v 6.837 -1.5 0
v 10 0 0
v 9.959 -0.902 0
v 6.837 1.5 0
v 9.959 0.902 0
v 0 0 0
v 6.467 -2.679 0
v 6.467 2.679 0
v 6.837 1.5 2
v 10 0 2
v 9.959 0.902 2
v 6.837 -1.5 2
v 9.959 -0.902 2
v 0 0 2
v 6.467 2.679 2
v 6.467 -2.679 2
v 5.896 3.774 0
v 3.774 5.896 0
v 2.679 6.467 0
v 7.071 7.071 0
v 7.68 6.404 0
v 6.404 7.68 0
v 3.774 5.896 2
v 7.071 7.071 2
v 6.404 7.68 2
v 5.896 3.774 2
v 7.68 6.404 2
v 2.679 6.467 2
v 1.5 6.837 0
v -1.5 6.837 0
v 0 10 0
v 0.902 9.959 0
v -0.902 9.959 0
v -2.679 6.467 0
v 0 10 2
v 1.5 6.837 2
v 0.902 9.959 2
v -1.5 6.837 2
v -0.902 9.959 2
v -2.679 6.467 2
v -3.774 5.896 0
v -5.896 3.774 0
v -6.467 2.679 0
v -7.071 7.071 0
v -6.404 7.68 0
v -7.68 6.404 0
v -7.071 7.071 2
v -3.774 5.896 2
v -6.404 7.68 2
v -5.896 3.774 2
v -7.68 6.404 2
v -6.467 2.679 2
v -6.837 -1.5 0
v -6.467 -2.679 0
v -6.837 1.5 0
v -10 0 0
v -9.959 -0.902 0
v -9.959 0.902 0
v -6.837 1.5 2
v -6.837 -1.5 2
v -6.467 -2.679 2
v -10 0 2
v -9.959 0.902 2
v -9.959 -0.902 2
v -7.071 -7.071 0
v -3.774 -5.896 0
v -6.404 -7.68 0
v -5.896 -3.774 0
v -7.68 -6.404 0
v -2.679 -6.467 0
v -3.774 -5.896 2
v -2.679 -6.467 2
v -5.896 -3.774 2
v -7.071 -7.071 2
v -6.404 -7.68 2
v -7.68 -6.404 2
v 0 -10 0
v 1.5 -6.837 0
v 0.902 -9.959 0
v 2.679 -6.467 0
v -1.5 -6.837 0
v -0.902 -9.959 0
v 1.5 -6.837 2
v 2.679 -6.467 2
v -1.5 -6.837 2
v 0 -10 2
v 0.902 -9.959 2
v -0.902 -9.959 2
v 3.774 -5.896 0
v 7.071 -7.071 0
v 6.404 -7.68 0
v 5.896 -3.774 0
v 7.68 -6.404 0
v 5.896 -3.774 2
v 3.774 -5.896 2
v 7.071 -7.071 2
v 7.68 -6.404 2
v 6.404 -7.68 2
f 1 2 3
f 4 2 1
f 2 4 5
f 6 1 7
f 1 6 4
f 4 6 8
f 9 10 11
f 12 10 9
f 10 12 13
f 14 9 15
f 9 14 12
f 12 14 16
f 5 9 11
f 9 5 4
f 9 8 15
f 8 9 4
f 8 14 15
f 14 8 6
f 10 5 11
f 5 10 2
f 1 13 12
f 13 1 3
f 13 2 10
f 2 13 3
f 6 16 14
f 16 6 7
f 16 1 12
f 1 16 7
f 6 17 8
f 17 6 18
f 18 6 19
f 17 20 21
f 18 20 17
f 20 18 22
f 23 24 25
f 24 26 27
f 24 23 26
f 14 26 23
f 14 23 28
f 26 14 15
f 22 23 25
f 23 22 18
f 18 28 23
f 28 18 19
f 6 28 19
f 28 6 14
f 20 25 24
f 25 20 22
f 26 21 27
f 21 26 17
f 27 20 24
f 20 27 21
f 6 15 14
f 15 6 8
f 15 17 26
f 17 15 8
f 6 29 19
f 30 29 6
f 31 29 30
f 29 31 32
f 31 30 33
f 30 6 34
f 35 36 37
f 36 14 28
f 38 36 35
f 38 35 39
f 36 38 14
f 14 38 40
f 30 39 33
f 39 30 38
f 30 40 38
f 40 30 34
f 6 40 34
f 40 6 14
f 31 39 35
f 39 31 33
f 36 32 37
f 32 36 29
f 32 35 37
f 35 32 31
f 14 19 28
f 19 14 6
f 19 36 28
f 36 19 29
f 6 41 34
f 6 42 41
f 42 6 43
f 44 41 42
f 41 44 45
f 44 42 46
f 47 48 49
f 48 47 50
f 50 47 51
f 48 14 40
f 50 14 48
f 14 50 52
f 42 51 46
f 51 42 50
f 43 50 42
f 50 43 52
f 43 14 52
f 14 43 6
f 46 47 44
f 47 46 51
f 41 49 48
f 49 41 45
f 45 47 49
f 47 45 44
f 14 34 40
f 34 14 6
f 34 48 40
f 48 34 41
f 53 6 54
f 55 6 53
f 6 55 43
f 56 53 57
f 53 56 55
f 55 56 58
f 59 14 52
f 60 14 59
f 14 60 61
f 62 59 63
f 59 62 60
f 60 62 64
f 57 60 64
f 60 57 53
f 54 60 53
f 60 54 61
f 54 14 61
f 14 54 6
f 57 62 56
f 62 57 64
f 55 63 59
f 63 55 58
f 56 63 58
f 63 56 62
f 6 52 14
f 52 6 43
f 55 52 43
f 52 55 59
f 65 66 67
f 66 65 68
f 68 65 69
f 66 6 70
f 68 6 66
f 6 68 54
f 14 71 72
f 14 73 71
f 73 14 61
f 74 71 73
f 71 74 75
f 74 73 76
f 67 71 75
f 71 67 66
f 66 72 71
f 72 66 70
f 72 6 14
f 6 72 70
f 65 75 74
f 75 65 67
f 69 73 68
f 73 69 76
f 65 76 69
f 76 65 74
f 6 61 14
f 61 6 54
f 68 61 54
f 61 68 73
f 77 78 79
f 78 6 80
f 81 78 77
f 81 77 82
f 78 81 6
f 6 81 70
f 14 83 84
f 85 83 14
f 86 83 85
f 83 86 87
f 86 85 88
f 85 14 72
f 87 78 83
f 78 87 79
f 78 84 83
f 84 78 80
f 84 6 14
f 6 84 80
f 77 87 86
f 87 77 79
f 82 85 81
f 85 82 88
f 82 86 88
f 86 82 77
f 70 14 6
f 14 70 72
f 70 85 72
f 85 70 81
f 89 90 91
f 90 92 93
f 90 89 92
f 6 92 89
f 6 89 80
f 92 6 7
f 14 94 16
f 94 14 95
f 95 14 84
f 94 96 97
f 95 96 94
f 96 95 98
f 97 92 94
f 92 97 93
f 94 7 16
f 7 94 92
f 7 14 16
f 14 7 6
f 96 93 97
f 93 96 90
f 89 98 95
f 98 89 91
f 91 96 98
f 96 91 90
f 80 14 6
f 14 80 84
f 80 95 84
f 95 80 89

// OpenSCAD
module gear(n, r, h, l) {
    tooth_angle = 360 / n / 2;
    
    
    for (i = [0: n]) {
        rotate([0, 0, tooth_angle * i * 2])
        union() {
            linear_extrude(l)
            polygon([
                [0, 0],
                [r, 0],
                [r * cos(tooth_angle * .23), r * sin(tooth_angle * .23)],
                [(r-h) * cos(tooth_angle * .55), (r-h) * sin(tooth_angle * .55)],
                [(r-h) * cos(tooth_angle), (r-h) * sin(tooth_angle)]
            ]);
            
            linear_extrude(l)
            rotate([180, 0, 0])
            polygon([
                [0, 0],
                [r, 0],
                [r * cos(tooth_angle * .23), r * sin(tooth_angle * .23)],
                [(r-h) * cos(tooth_angle * .55), (r-h) * sin(tooth_angle * .55)],
                [(r-h) * cos(tooth_angle), (r-h) * sin(tooth_angle)]
            ]);
        }
    }
}

module _plus_axis(r, w, h) {
    translate([w/2, w/2, 0])
    cube([r, r, h]);
    
    translate([-w/2 - r, w/2, 0])
    cube([r, r, h]);
 
    translate([-w/2 - r, -w/2 - r, 0])
    cube([r, r, h]);
    
    translate([w/2, -w/2 - r, 0])
    cube([r, r, h]);
}

module _plus_gear(r, w, h) {
    difference() {
        cylinder(h, r, r);
        
        translate([w/2, w/2, -1])
        cube([r, r, h]);
        
        translate([-w/2 - r, w/2, -1])
        cube([r, r, h]);
        
        translate([-w/2 - r, -w/2 - r, -1])
        cube([r, r, h]);
        
        translate([w/2, -w/2 - r, -1])
        cube([r, r, h]);
    }
}

gear(8, 10, 3, 2);
